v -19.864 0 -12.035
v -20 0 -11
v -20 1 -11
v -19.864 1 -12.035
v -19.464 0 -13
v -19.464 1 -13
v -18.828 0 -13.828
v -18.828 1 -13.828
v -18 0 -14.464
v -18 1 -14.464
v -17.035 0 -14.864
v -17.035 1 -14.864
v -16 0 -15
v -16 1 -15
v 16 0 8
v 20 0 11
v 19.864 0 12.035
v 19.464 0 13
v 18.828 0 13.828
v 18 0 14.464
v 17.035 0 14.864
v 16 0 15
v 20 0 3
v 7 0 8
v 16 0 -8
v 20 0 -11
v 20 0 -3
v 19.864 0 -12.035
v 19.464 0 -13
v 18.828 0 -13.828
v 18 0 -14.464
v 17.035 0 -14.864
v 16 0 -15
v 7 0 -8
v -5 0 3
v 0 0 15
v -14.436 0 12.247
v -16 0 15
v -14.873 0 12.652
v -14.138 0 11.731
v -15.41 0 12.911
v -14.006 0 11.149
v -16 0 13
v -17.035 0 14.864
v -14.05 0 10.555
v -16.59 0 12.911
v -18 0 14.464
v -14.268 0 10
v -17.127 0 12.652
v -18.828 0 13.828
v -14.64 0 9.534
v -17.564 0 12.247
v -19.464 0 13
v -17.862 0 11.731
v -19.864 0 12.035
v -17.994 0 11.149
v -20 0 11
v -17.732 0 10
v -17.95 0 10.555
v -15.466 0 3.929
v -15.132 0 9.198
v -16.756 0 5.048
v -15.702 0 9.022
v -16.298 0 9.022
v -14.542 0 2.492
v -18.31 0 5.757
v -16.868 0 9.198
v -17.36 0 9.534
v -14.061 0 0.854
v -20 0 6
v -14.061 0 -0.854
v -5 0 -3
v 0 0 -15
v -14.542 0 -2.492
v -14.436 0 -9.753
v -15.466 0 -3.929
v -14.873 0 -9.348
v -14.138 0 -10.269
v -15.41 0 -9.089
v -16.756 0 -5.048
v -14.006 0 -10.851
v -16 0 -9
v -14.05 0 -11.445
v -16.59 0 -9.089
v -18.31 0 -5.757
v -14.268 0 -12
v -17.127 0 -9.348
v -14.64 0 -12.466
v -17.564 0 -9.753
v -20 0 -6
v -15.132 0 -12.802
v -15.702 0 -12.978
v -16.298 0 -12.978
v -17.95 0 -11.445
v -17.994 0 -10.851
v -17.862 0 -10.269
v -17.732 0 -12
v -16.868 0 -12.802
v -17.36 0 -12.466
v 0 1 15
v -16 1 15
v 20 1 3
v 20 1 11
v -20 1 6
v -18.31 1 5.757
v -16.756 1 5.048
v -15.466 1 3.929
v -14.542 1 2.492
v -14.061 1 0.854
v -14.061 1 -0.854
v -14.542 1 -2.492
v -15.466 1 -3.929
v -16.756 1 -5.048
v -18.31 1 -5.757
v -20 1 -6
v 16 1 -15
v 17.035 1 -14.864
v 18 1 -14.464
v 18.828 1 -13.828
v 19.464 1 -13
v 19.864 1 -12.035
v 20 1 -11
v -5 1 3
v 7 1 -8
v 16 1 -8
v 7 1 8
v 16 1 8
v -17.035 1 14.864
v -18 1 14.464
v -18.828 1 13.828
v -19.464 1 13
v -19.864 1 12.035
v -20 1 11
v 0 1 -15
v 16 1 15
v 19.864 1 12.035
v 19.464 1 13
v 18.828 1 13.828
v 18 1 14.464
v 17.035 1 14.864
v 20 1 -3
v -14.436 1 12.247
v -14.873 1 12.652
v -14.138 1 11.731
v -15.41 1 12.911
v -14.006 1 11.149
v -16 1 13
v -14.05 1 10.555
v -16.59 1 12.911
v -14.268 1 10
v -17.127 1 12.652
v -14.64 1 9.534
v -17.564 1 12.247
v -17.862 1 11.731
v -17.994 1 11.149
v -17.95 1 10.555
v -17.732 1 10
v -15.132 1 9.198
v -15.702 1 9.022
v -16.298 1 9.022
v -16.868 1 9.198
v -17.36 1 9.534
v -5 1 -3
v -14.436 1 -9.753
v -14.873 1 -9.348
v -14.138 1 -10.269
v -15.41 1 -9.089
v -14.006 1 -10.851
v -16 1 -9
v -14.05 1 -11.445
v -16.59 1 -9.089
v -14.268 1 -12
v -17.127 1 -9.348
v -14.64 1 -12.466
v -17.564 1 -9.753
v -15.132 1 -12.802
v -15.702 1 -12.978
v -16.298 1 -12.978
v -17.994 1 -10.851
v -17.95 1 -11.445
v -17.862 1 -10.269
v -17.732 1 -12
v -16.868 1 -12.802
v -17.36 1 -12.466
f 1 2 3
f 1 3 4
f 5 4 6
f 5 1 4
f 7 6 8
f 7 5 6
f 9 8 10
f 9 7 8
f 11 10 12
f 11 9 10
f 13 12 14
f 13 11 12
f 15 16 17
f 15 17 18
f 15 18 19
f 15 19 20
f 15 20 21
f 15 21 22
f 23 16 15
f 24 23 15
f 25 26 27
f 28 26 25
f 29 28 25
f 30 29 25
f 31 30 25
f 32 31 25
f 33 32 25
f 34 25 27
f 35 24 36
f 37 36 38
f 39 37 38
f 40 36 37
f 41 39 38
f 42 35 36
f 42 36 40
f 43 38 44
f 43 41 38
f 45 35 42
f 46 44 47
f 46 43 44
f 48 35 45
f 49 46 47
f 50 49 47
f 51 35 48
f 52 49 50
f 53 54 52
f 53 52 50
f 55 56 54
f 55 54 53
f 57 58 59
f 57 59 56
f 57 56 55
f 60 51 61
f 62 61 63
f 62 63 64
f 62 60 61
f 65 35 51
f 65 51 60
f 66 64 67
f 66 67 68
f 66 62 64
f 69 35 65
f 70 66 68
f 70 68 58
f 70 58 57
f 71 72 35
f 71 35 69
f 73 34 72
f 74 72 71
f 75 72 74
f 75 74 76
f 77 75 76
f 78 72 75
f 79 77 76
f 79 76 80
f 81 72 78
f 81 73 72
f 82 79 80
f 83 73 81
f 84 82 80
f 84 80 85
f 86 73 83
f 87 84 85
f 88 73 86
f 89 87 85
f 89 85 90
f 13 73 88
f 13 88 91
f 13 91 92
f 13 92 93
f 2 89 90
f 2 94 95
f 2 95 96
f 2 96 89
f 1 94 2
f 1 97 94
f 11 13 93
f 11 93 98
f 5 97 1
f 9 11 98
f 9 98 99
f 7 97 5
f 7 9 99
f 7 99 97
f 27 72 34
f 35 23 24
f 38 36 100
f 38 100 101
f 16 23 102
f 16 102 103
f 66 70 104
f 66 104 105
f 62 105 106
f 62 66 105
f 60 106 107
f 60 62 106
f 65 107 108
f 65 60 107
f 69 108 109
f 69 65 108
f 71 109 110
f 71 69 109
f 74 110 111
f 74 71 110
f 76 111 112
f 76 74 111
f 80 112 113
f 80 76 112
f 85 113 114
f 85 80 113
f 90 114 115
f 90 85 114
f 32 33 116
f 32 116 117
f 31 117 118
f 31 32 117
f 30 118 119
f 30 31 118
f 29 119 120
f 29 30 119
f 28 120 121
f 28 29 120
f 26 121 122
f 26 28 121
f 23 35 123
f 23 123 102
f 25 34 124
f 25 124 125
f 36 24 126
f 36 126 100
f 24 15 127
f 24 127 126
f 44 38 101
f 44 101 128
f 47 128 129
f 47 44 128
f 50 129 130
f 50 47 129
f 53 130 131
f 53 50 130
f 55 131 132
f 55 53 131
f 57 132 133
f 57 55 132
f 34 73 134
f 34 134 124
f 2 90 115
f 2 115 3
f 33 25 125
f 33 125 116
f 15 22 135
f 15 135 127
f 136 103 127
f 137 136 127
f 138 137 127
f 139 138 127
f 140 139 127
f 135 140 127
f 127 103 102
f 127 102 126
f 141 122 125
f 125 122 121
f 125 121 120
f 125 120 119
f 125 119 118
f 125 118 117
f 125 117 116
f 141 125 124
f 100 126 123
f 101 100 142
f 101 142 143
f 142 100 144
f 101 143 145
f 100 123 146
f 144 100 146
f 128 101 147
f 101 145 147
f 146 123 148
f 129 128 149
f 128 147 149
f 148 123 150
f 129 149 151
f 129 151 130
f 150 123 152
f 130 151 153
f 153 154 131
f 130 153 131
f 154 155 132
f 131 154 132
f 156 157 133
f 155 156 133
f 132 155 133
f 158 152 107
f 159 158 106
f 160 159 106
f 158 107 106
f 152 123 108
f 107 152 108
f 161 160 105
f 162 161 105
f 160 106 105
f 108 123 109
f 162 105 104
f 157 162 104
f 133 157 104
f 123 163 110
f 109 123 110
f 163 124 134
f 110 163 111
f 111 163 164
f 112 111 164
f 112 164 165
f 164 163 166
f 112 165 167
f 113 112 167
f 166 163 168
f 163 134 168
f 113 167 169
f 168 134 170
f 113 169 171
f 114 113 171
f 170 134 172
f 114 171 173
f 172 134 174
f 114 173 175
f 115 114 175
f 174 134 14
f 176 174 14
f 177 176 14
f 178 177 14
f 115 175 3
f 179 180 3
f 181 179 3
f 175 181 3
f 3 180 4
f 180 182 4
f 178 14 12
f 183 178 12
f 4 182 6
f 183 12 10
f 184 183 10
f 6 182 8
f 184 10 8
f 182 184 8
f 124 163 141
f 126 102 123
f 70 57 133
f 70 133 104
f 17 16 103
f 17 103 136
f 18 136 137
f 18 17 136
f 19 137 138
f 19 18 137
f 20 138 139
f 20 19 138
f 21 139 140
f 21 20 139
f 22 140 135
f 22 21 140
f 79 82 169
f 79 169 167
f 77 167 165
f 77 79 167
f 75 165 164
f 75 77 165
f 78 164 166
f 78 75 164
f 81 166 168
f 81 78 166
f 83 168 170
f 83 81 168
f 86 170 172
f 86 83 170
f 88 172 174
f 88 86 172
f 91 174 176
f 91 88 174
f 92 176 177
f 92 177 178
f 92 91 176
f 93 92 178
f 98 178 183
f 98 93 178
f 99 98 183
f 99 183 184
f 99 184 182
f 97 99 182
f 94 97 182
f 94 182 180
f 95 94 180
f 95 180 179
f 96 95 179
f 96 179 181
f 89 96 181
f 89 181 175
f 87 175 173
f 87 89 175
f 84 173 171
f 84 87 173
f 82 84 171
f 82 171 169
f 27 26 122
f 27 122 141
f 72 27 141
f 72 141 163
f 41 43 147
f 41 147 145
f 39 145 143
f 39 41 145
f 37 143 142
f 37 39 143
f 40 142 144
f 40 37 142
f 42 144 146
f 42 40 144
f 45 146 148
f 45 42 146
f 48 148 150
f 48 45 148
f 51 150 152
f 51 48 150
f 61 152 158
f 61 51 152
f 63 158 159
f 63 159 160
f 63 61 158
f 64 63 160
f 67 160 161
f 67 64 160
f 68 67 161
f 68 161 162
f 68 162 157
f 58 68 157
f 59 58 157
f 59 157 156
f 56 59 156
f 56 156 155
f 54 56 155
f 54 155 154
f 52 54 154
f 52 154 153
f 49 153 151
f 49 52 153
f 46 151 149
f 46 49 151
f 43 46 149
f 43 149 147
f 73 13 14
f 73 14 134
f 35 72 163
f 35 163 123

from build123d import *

# Parameters (mm, degrees)
SKETCH1_R           = 2
BOSS_EXTRUDE1_DEPTH = 1


with BuildPart() as part:
    # Sketch1 → Boss-Extrude1 (new body)
    with BuildSketch(Plane(origin=(0, 0, 0), x_dir=(1, 0, 0), z_dir=(0, 1, 0))):
        with BuildLine():
            Line((-20, 6), (-20, 11))
            ThreePointArc((-20, 11), (-18.828427125, 13.828427125), (-16, 15))
            Line((-16, 15), (0, 15))
            Line((0, 15), (7, 8))
            Line((7, 8), (16, 8))
            Line((16, 8), (16, 15))
            ThreePointArc((16, 15), (18.828427125, 13.828427125), (20, 11))
            Line((20, 11), (20, 3))
            Line((20, 3), (-5, 3))
            Line((-5, 3), (-5, -3))
            Line((-5, -3), (20, -3))
            Line((20, -3), (20, -11))
            ThreePointArc((20, -11), (18.828427125, -13.828427125), (16, -15))
            Line((16, -15), (16, -8))
            Line((16, -8), (7, -8))
            Line((7, -8), (0, -15))
            Line((0, -15), (-16, -15))
            ThreePointArc((-16, -15), (-18.828427125, -13.828427125), (-20, -11))
            Line((-20, -11), (-20, -6))
            ThreePointArc((-20, -6), (-14, 0), (-20, 6))
        make_face()
        with Locations(Location((-16, -11, 0), (0, 0, 270))):
            Circle(SKETCH1_R, mode=Mode.SUBTRACT)
        with Locations(Location((-16, 11, 0), (0, 0, 270))):
            Circle(SKETCH1_R, mode=Mode.SUBTRACT)
    extrude(amount=BOSS_EXTRUDE1_DEPTH)


solid = part.part
